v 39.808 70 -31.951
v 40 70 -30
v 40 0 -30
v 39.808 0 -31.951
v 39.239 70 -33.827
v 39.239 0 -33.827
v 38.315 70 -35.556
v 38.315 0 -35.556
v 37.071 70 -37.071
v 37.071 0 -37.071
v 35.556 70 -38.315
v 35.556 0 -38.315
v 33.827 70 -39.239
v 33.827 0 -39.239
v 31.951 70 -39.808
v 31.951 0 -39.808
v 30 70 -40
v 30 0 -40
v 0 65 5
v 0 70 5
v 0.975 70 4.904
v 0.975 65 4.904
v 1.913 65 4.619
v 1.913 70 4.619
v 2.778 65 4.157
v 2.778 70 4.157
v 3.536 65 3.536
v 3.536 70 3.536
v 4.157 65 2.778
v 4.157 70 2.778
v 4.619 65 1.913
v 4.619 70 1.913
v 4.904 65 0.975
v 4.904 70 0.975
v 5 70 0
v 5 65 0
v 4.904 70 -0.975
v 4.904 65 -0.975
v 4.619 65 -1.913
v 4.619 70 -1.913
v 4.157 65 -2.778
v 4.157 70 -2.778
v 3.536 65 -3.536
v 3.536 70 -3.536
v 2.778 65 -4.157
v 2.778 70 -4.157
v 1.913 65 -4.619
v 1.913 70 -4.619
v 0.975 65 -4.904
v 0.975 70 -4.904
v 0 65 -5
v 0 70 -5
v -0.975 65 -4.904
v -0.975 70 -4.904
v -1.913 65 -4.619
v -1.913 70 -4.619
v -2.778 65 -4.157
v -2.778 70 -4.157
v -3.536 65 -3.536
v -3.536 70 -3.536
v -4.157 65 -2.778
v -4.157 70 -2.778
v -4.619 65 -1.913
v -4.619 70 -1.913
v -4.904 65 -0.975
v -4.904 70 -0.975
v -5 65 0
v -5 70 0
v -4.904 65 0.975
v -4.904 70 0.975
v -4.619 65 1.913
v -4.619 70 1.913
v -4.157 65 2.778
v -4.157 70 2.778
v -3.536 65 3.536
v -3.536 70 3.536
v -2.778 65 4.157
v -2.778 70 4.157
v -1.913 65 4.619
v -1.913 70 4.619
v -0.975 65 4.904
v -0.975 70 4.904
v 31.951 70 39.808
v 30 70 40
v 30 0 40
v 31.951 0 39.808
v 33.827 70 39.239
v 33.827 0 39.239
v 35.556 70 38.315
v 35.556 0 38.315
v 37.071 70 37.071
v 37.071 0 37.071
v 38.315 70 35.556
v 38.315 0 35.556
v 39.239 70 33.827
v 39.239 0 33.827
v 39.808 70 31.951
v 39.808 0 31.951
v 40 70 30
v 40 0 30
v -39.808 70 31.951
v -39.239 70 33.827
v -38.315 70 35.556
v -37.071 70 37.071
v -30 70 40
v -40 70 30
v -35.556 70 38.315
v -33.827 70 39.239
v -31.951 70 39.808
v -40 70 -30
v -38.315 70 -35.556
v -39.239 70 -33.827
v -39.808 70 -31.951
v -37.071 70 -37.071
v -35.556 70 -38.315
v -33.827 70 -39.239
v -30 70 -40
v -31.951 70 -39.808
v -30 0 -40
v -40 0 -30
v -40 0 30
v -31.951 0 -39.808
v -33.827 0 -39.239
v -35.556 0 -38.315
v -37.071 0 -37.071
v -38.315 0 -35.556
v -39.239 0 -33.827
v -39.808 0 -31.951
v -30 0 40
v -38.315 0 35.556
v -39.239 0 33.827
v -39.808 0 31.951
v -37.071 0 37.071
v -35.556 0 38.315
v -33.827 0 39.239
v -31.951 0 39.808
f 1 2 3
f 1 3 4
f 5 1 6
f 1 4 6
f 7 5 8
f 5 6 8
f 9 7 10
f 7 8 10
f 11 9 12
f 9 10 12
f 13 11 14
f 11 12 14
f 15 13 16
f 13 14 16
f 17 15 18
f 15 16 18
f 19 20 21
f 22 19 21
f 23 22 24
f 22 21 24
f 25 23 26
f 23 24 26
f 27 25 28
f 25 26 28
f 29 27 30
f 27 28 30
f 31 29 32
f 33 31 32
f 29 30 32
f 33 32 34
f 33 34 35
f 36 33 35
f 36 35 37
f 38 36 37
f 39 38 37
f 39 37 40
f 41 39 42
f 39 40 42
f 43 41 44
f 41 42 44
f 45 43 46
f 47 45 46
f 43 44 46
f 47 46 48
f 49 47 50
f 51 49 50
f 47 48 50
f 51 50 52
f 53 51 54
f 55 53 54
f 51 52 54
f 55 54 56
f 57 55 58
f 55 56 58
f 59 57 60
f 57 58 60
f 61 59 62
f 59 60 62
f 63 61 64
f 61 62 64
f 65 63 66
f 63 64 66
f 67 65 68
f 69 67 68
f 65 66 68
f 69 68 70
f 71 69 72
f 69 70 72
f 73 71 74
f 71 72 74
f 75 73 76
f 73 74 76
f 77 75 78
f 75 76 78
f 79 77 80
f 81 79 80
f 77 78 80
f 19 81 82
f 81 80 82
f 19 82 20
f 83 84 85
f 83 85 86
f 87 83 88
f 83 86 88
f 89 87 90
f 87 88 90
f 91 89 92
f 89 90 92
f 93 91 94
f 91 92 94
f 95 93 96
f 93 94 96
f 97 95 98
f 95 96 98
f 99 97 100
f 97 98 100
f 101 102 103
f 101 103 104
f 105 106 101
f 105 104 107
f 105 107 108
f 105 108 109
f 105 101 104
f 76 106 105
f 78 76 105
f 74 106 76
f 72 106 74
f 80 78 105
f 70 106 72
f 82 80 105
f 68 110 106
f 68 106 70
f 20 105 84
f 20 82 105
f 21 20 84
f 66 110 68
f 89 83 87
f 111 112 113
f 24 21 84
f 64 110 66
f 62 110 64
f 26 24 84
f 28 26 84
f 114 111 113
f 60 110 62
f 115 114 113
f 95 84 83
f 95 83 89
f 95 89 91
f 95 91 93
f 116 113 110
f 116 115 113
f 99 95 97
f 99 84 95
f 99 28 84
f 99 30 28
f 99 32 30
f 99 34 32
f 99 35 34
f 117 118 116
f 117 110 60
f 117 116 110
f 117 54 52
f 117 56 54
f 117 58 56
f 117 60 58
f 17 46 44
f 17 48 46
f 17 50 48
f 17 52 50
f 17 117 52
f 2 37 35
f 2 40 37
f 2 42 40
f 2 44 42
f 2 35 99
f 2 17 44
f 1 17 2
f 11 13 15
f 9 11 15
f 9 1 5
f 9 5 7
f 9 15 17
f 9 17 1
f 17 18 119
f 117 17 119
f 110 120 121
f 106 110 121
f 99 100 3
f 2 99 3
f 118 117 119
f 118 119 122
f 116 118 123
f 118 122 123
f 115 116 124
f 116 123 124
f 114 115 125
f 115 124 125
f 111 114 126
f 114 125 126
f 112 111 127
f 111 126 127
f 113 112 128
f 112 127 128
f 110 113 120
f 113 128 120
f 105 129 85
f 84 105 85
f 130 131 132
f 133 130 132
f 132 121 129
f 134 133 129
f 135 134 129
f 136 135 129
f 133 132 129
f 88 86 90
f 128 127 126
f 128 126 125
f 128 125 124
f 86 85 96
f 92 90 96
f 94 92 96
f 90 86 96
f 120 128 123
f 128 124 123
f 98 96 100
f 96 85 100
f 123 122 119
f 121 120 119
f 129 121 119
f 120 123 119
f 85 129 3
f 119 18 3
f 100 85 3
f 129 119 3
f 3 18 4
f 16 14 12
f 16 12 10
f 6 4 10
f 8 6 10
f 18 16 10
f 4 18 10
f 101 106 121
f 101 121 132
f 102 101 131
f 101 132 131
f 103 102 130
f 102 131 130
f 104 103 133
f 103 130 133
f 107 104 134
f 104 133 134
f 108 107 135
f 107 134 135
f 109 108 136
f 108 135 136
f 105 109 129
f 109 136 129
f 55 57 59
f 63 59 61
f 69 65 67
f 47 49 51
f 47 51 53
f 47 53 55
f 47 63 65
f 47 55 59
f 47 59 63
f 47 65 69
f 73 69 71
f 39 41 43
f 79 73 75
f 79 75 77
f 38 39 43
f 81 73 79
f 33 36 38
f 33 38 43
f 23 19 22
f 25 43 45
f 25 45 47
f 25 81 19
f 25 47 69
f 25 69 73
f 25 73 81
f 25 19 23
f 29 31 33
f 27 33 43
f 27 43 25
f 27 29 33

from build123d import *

# Parameters (mm, degrees)
BOSS_EXTRUDE1_DEPTH = 70
SKETCH2_R           = 5
CUT_EXTRUDE1_DEPTH  = 5


with BuildPart() as part:
    # Sketch1 → Boss-Extrude1 (new body)
    with BuildSketch(Plane(origin=(0, 0, 0), x_dir=(1, 0, 0), z_dir=(0, 1, 0))):
        with BuildLine():
            Line((-30, -40), (30, -40))
            ThreePointArc((30, -40), (37.071067812, -37.071067812), (40, -30))
            Line((40, -30), (40, 30))
            ThreePointArc((40, 30), (37.071067812, 37.071067812), (30, 40))
            Line((30, 40), (-30, 40))
            ThreePointArc((-30, 40), (-37.071067812, 37.071067812), (-40, 30))
            Line((-40, 30), (-40, -30))
            ThreePointArc((-40, -30), (-37.071067812, -37.071067812), (-30, -40))
        make_face()
    extrude(amount=BOSS_EXTRUDE1_DEPTH)

    # Sketch2 → Cut-Extrude1 (cut)
    with BuildSketch(Plane(origin=(0, 70, 0), x_dir=(1, 0, 0), z_dir=(0, 1, 0))):
        with Locations(Location((0, 0, 0), (0, 0, 270))):
            Circle(SKETCH2_R)
    extrude(amount=-CUT_EXTRUDE1_DEPTH, mode=Mode.SUBTRACT)


solid = part.part
